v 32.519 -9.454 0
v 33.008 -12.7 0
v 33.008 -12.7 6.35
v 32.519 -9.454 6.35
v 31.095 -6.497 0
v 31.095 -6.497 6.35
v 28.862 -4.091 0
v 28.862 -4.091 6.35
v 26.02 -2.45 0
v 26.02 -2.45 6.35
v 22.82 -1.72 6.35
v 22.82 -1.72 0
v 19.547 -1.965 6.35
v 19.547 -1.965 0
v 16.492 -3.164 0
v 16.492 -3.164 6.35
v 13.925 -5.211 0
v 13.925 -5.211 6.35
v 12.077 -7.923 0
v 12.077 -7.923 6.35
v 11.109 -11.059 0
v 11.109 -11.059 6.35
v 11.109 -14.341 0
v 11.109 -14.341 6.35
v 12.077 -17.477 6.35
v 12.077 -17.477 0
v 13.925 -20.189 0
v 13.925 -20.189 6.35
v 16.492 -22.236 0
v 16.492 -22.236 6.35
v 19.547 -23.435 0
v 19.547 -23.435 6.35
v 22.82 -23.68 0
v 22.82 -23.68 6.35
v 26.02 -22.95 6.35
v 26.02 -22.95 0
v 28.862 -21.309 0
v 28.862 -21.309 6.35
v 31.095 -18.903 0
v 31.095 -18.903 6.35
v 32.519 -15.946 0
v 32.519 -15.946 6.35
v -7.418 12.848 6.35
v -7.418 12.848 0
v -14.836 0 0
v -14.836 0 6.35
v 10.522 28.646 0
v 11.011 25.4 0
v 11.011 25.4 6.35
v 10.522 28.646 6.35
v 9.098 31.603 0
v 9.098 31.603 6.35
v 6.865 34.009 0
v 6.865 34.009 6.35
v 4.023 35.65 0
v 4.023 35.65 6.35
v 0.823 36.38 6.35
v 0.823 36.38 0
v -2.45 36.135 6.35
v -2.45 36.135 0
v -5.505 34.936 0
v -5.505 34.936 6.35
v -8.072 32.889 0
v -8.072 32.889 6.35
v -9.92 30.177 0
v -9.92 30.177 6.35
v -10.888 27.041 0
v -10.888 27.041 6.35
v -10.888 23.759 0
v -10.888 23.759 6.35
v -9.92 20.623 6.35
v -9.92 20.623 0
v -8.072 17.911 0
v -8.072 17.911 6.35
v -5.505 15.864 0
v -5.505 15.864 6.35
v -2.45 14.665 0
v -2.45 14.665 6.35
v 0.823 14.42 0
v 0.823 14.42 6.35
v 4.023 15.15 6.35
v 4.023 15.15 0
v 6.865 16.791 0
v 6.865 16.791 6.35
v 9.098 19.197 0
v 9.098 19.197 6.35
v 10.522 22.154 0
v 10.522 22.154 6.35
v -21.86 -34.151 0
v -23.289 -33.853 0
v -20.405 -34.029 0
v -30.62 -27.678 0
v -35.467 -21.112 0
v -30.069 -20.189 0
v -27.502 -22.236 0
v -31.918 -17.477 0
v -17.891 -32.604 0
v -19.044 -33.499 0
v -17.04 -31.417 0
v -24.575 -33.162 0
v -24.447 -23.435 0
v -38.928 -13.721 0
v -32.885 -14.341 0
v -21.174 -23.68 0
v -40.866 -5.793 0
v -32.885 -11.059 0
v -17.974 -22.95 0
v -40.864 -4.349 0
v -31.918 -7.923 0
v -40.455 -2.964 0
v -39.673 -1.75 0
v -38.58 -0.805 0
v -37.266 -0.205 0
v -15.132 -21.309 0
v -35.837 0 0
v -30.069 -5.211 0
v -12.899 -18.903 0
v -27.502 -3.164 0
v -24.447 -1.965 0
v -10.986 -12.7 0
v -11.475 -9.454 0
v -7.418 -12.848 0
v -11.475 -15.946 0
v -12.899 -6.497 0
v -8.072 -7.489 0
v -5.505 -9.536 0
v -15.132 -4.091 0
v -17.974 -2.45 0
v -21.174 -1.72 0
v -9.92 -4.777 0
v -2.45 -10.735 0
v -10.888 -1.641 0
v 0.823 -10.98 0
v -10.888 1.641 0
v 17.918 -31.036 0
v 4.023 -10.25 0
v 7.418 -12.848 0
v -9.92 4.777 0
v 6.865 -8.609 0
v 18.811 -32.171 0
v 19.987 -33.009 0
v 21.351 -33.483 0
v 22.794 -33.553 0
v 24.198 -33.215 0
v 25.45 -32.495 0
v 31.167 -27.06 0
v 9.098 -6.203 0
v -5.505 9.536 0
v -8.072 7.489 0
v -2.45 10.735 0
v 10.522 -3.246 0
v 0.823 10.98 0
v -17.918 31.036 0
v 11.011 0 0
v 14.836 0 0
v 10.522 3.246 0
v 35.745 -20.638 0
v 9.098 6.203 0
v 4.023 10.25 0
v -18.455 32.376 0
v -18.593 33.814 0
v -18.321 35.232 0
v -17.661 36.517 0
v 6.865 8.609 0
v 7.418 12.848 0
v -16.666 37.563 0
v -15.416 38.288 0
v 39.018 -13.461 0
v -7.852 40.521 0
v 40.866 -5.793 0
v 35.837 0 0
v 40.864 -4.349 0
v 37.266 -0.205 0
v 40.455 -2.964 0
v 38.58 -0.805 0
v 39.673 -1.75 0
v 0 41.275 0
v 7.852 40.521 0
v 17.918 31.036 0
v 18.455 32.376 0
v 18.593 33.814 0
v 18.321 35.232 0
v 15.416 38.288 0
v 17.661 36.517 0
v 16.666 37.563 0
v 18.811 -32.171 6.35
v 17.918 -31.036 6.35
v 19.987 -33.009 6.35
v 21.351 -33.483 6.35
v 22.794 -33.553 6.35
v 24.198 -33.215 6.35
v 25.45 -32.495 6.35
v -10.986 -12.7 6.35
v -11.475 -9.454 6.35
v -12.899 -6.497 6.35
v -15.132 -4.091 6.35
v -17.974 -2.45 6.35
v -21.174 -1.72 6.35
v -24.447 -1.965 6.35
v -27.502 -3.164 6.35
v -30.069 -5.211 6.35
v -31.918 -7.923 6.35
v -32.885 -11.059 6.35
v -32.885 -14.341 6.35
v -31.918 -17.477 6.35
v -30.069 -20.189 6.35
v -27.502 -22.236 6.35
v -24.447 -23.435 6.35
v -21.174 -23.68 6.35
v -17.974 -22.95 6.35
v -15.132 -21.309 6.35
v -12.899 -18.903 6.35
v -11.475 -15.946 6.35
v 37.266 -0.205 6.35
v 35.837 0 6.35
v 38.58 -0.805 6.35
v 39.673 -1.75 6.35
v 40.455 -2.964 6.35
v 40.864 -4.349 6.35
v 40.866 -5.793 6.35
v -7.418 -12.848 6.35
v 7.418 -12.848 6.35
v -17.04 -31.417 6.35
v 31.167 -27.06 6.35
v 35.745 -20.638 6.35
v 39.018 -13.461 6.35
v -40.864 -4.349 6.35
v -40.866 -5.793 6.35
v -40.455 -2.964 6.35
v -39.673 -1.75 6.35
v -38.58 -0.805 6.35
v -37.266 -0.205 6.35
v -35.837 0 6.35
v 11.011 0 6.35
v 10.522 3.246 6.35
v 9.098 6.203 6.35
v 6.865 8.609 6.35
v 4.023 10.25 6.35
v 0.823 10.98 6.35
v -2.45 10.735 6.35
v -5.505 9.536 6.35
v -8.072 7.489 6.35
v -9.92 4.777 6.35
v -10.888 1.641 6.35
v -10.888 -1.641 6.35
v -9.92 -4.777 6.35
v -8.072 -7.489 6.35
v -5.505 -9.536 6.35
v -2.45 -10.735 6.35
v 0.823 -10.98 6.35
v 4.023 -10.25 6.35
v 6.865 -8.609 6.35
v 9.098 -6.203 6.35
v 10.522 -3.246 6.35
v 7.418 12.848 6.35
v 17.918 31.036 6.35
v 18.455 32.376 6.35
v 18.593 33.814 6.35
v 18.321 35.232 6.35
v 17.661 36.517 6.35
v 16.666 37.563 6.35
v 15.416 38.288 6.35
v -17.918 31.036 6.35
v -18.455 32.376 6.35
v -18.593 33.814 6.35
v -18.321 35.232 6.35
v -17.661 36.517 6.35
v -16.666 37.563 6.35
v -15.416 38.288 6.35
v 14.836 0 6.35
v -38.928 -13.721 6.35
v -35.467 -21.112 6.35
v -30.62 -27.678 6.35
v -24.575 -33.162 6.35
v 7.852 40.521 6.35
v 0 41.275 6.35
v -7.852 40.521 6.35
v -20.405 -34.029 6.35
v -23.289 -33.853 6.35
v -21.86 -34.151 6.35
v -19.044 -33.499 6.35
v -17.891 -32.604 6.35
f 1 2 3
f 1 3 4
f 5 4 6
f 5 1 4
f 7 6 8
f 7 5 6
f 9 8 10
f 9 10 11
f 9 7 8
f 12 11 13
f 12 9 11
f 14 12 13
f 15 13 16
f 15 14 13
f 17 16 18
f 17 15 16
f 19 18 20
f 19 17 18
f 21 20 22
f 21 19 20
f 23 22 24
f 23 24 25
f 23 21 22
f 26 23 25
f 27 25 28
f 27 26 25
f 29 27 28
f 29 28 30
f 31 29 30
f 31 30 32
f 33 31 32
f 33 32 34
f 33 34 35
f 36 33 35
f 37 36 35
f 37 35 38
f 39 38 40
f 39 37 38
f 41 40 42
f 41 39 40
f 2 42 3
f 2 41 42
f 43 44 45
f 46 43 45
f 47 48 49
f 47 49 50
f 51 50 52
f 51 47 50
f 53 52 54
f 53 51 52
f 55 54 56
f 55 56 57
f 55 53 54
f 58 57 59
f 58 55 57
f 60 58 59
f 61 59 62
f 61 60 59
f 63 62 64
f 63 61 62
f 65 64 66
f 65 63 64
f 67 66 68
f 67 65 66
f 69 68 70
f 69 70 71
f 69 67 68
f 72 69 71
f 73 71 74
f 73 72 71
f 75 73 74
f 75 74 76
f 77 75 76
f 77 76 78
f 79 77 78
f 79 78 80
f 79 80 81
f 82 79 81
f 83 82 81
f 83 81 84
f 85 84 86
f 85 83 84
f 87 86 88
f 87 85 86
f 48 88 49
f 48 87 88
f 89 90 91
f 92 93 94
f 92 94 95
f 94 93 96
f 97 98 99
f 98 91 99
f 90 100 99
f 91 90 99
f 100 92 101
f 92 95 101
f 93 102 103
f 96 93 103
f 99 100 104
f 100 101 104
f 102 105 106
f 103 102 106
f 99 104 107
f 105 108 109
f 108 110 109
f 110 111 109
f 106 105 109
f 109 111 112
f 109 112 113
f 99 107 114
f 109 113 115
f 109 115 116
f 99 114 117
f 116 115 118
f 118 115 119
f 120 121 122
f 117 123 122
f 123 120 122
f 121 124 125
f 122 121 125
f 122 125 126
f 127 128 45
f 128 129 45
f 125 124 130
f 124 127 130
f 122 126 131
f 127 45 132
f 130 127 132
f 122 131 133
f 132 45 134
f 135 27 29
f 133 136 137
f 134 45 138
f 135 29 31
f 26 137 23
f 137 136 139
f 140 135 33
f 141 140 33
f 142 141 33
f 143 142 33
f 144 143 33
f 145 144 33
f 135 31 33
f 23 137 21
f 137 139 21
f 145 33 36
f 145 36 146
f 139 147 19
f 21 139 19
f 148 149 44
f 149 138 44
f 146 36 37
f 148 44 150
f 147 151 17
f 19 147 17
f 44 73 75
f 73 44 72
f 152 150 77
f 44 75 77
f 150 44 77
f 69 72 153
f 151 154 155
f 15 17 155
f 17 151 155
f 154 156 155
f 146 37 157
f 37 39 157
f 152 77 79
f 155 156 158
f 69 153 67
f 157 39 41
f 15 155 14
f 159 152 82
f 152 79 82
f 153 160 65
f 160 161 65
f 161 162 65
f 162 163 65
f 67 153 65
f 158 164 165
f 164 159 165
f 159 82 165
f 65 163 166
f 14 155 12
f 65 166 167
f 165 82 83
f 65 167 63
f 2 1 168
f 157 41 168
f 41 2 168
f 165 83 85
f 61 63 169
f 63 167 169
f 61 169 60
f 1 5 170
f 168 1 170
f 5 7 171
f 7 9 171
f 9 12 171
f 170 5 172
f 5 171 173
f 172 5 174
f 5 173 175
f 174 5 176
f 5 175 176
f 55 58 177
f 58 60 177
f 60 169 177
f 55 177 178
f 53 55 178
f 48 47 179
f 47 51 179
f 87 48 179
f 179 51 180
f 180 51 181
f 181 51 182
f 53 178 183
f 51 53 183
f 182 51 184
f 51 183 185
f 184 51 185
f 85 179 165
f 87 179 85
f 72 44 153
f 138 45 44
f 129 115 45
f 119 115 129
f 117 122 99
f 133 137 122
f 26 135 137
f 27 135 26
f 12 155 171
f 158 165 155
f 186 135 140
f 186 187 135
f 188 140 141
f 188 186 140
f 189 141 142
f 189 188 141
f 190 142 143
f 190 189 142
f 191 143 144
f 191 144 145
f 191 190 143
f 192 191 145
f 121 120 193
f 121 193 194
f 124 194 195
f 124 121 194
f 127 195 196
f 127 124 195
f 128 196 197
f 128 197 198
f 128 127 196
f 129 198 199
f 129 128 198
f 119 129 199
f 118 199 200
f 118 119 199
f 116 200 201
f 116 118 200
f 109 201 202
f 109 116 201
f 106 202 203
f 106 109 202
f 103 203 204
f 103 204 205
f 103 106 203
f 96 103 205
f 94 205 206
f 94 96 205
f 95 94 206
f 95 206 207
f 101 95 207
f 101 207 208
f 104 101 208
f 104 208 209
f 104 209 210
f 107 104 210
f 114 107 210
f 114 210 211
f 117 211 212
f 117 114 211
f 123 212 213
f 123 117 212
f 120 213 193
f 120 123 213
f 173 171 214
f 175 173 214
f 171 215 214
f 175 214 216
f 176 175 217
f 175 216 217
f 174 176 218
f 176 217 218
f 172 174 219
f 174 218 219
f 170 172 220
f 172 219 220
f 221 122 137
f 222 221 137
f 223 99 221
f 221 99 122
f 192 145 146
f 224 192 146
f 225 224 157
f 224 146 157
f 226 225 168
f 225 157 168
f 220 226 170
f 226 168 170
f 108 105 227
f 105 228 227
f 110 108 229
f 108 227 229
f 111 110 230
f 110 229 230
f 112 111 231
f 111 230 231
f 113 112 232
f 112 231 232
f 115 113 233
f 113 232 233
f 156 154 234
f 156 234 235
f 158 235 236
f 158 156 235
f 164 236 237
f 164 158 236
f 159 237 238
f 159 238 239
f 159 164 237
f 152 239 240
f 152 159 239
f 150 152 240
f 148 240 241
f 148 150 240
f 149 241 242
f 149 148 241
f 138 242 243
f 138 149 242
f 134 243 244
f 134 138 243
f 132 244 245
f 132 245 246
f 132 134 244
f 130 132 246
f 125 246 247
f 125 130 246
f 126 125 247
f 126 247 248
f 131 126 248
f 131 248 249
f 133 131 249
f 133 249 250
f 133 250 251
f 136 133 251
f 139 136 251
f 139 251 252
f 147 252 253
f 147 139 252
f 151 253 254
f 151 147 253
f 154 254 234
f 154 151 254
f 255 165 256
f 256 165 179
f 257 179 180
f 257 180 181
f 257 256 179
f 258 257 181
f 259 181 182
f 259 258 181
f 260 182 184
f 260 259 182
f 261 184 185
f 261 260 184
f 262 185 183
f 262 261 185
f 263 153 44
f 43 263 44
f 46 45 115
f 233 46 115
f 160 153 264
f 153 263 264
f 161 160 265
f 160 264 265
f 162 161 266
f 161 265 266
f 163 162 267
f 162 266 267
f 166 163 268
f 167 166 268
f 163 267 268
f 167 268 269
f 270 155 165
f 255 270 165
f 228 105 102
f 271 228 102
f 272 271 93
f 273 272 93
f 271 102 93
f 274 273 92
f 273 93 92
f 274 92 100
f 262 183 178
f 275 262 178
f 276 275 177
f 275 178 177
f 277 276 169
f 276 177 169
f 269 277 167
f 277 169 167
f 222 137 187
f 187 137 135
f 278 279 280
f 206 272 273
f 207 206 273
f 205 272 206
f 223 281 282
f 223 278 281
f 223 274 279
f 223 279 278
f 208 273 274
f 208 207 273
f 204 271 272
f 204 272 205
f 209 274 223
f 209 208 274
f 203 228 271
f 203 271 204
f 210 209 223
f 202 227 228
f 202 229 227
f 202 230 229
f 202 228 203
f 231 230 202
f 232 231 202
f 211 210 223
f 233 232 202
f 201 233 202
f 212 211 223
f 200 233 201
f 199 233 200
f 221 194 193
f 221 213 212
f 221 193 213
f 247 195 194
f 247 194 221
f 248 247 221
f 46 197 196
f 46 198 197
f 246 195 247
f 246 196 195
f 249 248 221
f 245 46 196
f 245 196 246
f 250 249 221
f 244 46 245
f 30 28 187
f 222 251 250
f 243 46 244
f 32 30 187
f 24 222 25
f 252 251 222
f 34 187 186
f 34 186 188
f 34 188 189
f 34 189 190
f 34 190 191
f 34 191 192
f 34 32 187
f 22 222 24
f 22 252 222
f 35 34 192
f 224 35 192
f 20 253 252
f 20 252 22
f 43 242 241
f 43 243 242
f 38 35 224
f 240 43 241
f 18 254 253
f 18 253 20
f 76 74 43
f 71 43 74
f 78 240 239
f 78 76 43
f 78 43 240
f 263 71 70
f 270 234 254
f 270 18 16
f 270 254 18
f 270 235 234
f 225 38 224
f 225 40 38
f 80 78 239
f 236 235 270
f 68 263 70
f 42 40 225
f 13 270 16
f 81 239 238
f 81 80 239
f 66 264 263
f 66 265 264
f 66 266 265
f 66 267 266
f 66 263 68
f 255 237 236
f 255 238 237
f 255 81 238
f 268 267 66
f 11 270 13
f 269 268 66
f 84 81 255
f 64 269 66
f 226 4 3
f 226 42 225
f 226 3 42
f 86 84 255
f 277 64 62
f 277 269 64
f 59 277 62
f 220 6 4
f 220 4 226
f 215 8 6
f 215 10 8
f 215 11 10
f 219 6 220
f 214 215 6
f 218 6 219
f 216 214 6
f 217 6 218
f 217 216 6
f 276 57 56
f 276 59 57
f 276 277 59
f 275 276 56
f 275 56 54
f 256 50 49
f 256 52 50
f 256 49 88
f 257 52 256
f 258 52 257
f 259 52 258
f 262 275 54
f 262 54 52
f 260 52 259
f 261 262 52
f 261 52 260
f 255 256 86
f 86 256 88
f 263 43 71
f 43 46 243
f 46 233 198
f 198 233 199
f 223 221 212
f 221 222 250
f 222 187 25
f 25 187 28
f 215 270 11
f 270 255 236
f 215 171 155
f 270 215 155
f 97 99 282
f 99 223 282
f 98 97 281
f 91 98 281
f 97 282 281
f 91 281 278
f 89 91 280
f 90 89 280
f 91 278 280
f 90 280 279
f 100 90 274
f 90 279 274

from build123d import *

# Parameters (mm, degrees)
F0_R     = 11.0109
F1_DEPTH = 6.35
F2_R     = 5.08
F3_R     = 5.08
F4_R     = 5.08
F5_R     = 5.08
F6_R     = 5.08
F7_R     = 5.08


with BuildPart() as f1:
    # F0 (on Top) → F1 (new body)
    with BuildSketch(Plane.XY):
        Polygon((7.417982, -12.848321), (14.835964, 0), (7.417982, 12.848321), (-7.417982, 12.848321), (-14.835964, 0), (-7.417982, -12.848321), align=None)
        Circle(F0_R, mode=Mode.SUBTRACT)
        with BuildLine():
            ThreePointArc((20.6375, -35.745199), (35.745199, -20.6375), (41.275, 0))
            Line((41.275, 0), (14.835964, 0))
            Line((14.835964, 0), (7.417982, -12.848321))
            Line((7.417982, -12.848321), (20.6375, -35.745199))
        make_face()
        with Locations((21.997045, -12.7)):
            Circle(F0_R, mode=Mode.SUBTRACT)
        with BuildLine():
            ThreePointArc((-41.275, 0), (-35.440503, -21.156474), (-19.586502, -36.331729))
            Line((-19.586502, -36.331729), (-7.417982, -12.848321))
            Line((-7.417982, -12.848321), (-14.835964, 0))
            Line((-14.835964, 0), (-41.275, 0))
        make_face()
        with Locations((-21.997045, -12.7)):
            Circle(F0_R, mode=Mode.SUBTRACT)
        with BuildLine():
            Line((7.417982, 12.848321), (20.6375, 35.745199))
            ThreePointArc((20.6375, 35.745199), (0, 41.275), (-20.6375, 35.745199))
            Line((-20.6375, 35.745199), (-7.417982, 12.848321))
            Line((-7.417982, 12.848321), (7.417982, 12.848321))
        make_face()
        with Locations((0, 25.4)):
            Circle(F0_R, mode=Mode.SUBTRACT)
    extrude(amount=F1_DEPTH)

    # F2
    f2_edges = [f1.edges().sort_by_distance(p)[0] for p in [
        (-19.586502, -36.331729, 3.175),
    ]]
    fillet(f2_edges, radius=F2_R)

    # F3
    f3_edges = [f1.edges().sort_by_distance(p)[0] for p in [
        (20.6375, -35.745199, 3.175),
    ]]
    fillet(f3_edges, radius=F3_R)

    # F4
    f4_edges = [f1.edges().sort_by_distance(p)[0] for p in [
        (-41.275, 0, 3.175),
    ]]
    fillet(f4_edges, radius=F4_R)

    # F5
    f5_edges = [f1.edges().sort_by_distance(p)[0] for p in [
        (-20.6375, 35.745199, 3.175),
    ]]
    fillet(f5_edges, radius=F5_R)

    # F6
    f6_edges = [f1.edges().sort_by_distance(p)[0] for p in [
        (41.275, 0, 3.175),
    ]]
    fillet(f6_edges, radius=F6_R)

    # F7
    f7_edges = [f1.edges().sort_by_distance(p)[0] for p in [
        (20.6375, 35.745199, 3.175),
    ]]
    fillet(f7_edges, radius=F7_R)


solid = f1.part
